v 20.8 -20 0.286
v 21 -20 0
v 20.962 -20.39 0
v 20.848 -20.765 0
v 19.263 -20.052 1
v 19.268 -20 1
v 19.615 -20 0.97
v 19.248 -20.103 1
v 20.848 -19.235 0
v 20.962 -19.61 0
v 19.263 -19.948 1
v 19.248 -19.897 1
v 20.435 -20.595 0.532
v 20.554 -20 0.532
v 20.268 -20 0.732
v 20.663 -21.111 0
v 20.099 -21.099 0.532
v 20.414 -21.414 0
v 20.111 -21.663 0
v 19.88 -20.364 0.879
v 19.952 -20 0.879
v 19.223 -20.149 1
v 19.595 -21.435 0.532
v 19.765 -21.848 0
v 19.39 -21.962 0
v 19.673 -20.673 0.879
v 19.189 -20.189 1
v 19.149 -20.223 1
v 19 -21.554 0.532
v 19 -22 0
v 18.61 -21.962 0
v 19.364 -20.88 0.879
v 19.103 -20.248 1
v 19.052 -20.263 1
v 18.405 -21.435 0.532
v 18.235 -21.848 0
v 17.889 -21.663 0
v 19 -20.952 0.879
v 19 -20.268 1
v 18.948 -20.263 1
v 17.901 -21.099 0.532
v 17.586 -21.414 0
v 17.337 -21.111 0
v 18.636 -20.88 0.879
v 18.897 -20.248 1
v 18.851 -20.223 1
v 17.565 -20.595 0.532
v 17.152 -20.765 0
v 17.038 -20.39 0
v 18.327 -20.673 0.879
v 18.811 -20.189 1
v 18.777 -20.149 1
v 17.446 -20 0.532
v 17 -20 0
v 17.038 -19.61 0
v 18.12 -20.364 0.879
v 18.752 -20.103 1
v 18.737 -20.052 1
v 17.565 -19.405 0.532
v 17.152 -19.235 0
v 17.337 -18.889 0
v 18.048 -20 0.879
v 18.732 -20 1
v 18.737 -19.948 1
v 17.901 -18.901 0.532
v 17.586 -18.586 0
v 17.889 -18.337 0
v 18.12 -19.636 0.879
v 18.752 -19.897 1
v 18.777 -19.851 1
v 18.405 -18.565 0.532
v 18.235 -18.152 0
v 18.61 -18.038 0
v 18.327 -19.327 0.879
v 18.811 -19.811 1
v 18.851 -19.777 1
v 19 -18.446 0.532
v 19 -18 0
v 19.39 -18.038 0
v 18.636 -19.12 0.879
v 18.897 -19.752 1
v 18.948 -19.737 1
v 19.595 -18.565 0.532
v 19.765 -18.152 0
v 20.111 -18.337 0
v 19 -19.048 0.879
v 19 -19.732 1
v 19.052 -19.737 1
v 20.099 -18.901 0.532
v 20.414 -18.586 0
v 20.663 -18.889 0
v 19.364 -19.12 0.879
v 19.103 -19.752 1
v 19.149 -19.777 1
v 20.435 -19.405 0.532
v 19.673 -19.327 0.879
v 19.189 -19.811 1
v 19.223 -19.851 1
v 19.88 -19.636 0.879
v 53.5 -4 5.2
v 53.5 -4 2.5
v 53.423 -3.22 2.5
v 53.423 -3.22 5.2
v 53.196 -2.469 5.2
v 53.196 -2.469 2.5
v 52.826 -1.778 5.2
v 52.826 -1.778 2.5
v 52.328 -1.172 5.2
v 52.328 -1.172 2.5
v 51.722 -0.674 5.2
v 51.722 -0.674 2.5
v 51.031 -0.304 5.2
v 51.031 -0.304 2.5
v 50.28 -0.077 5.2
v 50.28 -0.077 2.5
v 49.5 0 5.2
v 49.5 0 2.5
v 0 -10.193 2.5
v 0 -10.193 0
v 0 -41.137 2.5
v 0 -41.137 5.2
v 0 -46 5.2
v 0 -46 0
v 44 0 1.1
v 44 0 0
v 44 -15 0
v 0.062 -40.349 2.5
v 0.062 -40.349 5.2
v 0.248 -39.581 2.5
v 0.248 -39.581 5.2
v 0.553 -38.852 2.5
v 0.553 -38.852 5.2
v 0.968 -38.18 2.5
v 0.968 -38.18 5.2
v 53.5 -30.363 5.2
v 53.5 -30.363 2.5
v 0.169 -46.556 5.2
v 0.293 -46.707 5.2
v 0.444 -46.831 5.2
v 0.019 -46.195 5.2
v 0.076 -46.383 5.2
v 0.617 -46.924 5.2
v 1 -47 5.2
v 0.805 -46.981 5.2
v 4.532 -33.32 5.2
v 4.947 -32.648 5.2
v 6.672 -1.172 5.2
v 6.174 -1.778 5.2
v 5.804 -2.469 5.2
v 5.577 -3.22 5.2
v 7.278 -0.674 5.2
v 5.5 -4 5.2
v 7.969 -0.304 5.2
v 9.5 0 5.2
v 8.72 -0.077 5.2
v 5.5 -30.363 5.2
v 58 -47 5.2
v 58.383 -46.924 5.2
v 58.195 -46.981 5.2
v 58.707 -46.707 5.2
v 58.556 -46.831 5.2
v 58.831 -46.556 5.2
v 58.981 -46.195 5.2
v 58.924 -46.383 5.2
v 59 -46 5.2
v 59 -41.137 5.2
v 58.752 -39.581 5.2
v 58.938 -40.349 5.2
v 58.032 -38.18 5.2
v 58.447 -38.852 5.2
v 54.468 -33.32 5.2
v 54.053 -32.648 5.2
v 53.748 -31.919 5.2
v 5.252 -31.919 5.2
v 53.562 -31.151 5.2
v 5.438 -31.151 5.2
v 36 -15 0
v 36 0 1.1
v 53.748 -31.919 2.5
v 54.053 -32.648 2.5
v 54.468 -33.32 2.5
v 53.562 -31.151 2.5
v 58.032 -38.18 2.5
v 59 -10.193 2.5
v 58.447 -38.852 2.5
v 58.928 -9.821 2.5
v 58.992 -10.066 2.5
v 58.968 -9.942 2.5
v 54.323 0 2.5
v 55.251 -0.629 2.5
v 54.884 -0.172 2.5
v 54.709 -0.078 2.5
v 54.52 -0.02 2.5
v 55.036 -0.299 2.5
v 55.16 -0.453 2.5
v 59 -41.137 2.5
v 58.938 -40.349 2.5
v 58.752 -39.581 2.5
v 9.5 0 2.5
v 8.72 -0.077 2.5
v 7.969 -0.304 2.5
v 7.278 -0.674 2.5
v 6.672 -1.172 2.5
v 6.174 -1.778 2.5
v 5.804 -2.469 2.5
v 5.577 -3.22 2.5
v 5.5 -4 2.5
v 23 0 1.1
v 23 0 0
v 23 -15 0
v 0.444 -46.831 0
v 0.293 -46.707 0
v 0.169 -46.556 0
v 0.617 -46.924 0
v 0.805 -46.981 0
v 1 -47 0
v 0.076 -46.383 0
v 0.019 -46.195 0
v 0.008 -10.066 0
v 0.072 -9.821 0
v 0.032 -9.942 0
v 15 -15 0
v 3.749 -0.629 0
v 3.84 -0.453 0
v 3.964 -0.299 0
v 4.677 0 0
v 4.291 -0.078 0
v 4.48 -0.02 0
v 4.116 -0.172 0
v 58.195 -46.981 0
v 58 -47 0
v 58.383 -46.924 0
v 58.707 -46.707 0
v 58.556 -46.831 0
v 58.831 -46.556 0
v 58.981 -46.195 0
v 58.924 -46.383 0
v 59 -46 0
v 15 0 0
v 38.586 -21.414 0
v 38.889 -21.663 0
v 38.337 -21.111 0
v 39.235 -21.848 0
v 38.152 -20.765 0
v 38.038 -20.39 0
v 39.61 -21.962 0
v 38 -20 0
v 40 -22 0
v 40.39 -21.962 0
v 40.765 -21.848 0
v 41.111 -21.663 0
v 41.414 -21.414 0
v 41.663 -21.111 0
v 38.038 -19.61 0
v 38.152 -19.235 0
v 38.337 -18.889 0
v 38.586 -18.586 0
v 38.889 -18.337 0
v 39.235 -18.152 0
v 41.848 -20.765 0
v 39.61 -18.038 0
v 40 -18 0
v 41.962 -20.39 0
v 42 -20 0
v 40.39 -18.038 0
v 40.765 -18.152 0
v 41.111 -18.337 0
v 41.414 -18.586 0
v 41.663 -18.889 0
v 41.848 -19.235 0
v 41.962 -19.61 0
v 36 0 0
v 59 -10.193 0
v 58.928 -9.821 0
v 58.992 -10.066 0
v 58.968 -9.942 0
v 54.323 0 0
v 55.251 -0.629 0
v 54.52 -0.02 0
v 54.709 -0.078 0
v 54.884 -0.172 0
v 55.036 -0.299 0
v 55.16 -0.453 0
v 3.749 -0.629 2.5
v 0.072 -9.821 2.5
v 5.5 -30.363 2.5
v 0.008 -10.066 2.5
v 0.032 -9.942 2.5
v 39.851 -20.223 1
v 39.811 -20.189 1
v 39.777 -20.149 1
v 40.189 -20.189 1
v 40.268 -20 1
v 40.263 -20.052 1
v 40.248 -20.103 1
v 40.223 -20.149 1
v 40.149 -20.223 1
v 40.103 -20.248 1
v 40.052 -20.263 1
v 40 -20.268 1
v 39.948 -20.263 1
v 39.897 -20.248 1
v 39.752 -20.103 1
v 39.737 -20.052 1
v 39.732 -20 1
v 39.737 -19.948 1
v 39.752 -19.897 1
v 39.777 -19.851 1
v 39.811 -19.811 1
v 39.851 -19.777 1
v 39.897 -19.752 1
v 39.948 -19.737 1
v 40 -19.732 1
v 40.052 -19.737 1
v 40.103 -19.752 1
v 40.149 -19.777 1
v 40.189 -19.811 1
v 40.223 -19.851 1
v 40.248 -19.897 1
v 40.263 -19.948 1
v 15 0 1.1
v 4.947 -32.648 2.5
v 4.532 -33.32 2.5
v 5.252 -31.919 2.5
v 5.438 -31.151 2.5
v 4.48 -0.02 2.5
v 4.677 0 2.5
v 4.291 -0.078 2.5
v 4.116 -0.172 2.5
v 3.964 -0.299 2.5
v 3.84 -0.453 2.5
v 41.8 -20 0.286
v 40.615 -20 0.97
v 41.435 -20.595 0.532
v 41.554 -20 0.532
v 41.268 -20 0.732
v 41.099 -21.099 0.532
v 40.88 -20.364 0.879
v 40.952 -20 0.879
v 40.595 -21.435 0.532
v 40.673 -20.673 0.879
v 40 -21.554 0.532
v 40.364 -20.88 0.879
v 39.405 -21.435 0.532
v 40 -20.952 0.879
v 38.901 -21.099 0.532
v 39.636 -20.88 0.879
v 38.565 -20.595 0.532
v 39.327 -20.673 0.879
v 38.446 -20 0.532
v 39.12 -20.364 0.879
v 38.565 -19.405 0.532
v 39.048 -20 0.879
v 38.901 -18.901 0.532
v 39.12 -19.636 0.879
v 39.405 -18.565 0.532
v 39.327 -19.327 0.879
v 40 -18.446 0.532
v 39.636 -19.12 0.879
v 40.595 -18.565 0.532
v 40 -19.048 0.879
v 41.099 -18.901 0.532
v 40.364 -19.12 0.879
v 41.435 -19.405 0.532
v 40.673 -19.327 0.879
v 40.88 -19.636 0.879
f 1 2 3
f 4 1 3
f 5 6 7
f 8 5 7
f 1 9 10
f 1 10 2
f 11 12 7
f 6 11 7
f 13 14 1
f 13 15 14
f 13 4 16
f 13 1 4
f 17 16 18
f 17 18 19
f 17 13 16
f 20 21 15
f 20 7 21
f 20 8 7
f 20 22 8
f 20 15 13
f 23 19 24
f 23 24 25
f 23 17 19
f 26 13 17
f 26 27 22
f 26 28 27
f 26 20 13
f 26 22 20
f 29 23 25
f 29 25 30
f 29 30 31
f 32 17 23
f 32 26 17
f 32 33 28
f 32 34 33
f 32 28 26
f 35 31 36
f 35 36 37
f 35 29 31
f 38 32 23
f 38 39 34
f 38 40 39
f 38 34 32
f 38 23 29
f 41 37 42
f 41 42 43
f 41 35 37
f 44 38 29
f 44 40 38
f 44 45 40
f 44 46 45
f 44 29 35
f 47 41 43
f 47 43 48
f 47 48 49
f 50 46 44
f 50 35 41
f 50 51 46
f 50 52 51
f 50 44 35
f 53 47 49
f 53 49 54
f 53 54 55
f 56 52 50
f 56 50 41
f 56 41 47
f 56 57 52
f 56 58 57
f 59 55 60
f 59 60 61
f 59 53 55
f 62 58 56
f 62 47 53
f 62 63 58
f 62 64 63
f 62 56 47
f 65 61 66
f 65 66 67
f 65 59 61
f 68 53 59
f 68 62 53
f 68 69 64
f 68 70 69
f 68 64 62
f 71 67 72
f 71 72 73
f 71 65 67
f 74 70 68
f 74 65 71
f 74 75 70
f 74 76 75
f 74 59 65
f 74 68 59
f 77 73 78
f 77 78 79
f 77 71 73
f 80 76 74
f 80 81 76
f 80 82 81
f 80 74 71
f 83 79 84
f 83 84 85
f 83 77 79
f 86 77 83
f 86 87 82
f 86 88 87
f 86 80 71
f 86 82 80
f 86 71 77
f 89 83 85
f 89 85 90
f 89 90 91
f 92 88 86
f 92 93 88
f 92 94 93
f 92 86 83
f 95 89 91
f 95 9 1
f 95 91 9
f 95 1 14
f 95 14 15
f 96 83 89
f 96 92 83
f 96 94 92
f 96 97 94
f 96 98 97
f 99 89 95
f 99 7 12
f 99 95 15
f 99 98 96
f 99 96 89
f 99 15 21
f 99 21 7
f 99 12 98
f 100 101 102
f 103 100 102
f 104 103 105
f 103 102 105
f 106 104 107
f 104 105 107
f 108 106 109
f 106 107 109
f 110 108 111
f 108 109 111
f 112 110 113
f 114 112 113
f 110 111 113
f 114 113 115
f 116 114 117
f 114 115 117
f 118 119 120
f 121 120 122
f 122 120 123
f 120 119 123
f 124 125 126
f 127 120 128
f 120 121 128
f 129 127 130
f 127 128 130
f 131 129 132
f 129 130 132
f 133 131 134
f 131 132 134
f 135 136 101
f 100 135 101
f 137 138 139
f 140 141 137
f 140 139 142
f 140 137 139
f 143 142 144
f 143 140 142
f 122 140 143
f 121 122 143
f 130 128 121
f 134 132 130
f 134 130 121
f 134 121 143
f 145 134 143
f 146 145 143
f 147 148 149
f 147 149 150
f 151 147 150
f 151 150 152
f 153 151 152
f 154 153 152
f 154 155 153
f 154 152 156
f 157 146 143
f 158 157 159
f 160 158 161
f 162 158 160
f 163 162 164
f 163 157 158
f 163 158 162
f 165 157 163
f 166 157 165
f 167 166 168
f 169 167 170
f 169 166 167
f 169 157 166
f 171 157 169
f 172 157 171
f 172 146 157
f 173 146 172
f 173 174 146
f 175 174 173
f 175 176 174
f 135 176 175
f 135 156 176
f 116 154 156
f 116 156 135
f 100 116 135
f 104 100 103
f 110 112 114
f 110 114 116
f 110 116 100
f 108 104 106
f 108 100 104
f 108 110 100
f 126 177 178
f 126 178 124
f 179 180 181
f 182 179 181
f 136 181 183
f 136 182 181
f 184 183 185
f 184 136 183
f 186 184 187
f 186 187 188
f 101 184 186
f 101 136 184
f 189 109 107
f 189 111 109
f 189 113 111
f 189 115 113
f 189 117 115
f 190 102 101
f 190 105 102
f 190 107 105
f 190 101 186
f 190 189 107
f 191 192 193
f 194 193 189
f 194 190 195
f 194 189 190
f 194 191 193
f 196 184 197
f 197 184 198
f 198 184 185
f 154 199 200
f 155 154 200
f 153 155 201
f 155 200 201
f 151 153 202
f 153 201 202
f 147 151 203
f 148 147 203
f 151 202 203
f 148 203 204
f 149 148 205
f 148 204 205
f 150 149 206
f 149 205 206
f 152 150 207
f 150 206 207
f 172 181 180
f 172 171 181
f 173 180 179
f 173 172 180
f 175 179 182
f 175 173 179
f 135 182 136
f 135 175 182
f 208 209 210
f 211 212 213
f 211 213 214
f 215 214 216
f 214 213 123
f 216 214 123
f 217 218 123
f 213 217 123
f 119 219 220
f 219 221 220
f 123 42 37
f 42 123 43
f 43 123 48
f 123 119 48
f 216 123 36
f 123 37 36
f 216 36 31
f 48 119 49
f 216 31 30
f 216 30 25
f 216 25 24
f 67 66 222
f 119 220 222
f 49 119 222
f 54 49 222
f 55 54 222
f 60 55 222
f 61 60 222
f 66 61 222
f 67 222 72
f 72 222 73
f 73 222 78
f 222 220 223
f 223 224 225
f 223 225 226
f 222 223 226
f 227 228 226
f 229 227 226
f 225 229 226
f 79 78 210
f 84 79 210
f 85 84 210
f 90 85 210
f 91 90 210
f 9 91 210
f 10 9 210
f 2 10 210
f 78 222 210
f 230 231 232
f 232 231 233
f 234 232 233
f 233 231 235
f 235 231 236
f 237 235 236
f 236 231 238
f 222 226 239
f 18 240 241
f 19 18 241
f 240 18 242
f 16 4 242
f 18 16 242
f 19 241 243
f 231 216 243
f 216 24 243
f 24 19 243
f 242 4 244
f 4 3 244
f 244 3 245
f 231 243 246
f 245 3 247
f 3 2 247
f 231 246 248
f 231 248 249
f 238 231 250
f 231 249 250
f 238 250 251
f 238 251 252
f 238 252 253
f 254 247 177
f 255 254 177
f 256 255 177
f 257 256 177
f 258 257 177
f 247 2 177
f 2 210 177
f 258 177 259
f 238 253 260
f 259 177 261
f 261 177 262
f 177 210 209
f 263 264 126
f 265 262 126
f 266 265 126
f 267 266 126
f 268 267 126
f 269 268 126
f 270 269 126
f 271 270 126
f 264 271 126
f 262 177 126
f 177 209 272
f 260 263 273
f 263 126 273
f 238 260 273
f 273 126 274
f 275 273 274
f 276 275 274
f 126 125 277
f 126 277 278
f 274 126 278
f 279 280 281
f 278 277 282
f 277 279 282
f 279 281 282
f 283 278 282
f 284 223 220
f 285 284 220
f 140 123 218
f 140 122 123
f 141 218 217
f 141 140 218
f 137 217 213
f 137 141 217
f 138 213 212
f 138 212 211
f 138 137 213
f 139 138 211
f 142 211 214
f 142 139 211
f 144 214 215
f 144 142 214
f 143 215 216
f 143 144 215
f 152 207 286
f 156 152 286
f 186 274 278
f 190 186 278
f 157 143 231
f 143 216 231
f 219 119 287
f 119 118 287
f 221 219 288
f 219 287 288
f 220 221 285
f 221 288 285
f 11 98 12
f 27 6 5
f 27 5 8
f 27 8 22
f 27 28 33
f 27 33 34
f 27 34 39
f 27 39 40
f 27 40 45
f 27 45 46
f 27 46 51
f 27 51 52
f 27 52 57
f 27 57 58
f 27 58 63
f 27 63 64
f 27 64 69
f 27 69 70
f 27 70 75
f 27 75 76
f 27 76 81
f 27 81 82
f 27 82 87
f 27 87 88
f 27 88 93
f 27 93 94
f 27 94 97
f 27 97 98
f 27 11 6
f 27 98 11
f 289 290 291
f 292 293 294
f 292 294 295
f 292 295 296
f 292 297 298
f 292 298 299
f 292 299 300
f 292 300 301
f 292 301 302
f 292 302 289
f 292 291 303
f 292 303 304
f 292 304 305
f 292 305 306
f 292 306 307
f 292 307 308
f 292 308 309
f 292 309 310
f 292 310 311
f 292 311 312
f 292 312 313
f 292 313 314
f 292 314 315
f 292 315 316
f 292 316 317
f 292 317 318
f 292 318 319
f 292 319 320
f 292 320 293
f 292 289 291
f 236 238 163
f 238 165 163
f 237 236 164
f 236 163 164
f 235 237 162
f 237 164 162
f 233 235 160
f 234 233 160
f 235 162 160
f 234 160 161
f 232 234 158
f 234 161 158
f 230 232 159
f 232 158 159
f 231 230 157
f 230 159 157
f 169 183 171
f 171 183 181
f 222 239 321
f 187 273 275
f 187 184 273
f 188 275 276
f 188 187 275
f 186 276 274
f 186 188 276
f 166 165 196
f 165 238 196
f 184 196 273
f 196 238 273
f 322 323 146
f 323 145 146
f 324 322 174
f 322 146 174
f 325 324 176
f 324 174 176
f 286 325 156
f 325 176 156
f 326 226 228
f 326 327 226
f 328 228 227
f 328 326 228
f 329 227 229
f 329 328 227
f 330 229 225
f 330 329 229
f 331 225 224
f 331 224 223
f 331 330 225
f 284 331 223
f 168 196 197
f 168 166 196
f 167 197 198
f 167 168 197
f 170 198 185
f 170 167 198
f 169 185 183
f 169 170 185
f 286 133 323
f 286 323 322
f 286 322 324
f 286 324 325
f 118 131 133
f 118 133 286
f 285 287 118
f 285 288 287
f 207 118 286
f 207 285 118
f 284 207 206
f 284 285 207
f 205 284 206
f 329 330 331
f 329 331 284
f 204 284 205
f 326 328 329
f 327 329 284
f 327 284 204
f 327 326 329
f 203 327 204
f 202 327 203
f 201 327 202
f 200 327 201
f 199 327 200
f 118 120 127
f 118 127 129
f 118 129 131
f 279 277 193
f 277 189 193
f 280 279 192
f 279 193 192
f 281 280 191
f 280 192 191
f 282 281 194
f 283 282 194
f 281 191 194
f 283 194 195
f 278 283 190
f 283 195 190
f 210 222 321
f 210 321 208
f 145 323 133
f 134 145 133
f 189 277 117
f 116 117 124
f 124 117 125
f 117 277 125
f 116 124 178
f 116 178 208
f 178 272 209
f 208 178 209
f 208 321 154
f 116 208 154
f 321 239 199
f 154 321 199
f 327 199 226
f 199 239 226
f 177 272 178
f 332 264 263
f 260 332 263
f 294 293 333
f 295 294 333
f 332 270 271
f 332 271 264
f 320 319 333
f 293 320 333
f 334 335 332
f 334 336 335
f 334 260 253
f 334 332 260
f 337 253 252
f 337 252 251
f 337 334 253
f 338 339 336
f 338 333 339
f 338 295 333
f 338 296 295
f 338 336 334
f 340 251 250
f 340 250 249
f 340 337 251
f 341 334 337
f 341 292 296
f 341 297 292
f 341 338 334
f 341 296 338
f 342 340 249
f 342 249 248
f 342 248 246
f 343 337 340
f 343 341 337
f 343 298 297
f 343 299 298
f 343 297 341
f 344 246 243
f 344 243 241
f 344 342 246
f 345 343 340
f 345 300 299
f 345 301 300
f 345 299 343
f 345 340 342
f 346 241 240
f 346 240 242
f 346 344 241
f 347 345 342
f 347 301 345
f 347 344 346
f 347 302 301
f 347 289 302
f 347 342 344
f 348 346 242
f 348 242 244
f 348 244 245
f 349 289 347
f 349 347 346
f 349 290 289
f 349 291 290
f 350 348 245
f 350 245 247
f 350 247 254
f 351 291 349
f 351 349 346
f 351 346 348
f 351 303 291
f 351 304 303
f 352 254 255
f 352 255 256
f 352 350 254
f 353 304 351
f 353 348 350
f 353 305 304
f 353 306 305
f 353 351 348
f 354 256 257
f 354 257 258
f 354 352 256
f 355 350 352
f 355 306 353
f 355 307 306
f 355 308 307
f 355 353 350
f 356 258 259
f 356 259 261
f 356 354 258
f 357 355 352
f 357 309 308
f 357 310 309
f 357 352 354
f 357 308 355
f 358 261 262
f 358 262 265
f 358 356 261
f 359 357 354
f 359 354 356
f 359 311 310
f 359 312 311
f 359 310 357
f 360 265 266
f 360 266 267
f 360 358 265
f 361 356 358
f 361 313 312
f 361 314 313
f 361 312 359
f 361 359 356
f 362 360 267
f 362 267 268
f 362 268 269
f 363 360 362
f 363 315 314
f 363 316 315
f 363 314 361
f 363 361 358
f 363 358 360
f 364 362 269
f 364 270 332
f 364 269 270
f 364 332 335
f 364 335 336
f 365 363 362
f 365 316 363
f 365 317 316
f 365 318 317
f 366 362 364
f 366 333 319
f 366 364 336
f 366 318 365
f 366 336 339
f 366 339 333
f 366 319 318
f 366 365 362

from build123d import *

# Parameters (mm, degrees)
F1_DEPTH    = 2.5
F3_DEPTH    = 2.7
F4_R        = 1
F5_R        = 5
F7_R        = 2
F8_DEPTH    = 1
F6_W        = 8
F6_H        = 15
F9_DEPTH    = 1.1
F10_SIZE2   = 1.09999
F10_SIZE    = 14.99999
F10_2_SIZE2 = 1.09999
F10_2_SIZE  = 14.99999


# Not quite as in the source:
# - a fillet or chamfer that OpenCascade refuses, or shapes differently, is made with other operations: its cross-section is extruded or revolved along the edge and cut away or added
# - two fillets or chamfers of one size are made in one step
# - a fillet or chamfer is up to 0.001 mm smaller than in the source, because OpenCascade refuses the exact size


with BuildPart() as f1:
    # F0 (on Top) → F1 (new body)
    with BuildSketch(Plane.XY):
        Polygon((55, 0), (4, 0), (0, -10), (0, -47), (59, -47), (59, -10), align=None)
    extrude(amount=F1_DEPTH)

    # F2 (on face) → F3 (join)
    with BuildSketch(Plane.XY.offset(2.5)):
        with BuildLine():
            Line((0, -39.5), (0, -47))
            Line((0, -47), (59, -47))
            Line((59, -47), (59, -39.5))
            Line((59, -39.5), (53.5, -32))
            Line((53.5, -32), (53.5, -4))
            ThreePointArc((53.5, -4), (52.3284271247, -1.1715728753), (49.5, 0))
            Line((49.5, 0), (9.5, 0))
            ThreePointArc((9.5, 0), (6.6715728753, -1.1715728753), (5.5, -4))
            Line((5.5, -4), (5.5, -32))
            Line((5.5, -32), (0, -39.5))
        make_face()
    extrude(amount=F3_DEPTH)

    # F4
    f4_edges = [f1.edges().sort_by_distance(p)[0] for p in [
        (0, -47, 2.6),
        (59, -47, 2.6),
        (4, 0, 1.25),
        (55, 0, 1.25),
        (59, -10, 1.25),
        (0, -10, 1.25),
    ]]
    fillet(f4_edges, radius=F4_R)

    # F5
    f5_edges = [f1.edges().sort_by_distance(p)[0] for p in [
        (0, -39.5, 3.85),
        (59, -39.5, 3.85),
        (53.5, -32, 3.85),
        (5.5, -32, 3.85),
    ]]
    fillet(f5_edges, radius=F5_R)

    # F7 (on face) → F8 (cut)
    with BuildSketch(Plane(origin=(0, 0, 0), x_dir=(1, 0, 0), z_dir=(0, 0, -1))):
        with Locations((19, 20)):
            Circle(F7_R)
        with Locations((40, 20)):
            Circle(F7_R)
    extrude(amount=-F8_DEPTH, mode=Mode.SUBTRACT)

    # F6 (on face) → F9 (cut)
    with BuildSketch(Plane(origin=(0, 0, 0), x_dir=(1, 0, 0), z_dir=(0, 0, -1))):
        with Locations((40, 7.5)):
            Rectangle(F6_W, F6_H)
        with Locations((19, 7.5)):
            Rectangle(F6_W, F6_H)
    extrude(amount=-F9_DEPTH, mode=Mode.SUBTRACT)

    # F10 (size 15 and 1.1 in the source; OpenCascade refuses exactly that, so slightly less here)
    f10_edges = [f1.edges().sort_by_distance(p)[0] for p in [
        (40, -15, 1.1),
    ]]
    f10_side = f1.faces().sort_by_distance((40, -7.5, 1.1))[0]
    chamfer(f10_edges, length=F10_SIZE, length2=F10_SIZE2, reference=f10_side)

    # F10#2 (size 15 and 1.1 in the source; OpenCascade refuses exactly that, so slightly less here)
    f10_2_edges = [f1.edges().sort_by_distance(p)[0] for p in [
        (19, -15, 1.1),
    ]]
    f10_2_side = f1.faces().sort_by_distance((19, -7.5, 1.1))[0]
    chamfer(f10_2_edges, length=F10_2_SIZE, length2=F10_2_SIZE2, reference=f10_2_side)

    # F12: fillet of radius 2 on 2 edges, made by hand

    # F12_s1 → F12_t2 (revolve)
    with BuildSketch(Plane.XZ.offset(20)):
        with BuildLine():
            ThreePointArc((42, 0), (41.2679491924, 0.7320508076), (40.2679491924, 1))
            Line((40.2679491924, 1), (42, 1))
            Line((42, 1), (42, 0))
        make_face()
    revolve(axis=Axis((40, -20, 1), (0, 0, -1)))

    # F12_s3 → F12_t4 (revolve)
    with BuildSketch(Plane.XZ.offset(20)):
        with BuildLine():
            ThreePointArc((21, 0), (20.2679491924, 0.7320508076), (19.2679491924, 1))
            Line((19.2679491924, 1), (21, 1))
            Line((21, 1), (21, 0))
        make_face()
    revolve(axis=Axis((19, -20, 1), (0, 0, -1)))


solid = f1.part
